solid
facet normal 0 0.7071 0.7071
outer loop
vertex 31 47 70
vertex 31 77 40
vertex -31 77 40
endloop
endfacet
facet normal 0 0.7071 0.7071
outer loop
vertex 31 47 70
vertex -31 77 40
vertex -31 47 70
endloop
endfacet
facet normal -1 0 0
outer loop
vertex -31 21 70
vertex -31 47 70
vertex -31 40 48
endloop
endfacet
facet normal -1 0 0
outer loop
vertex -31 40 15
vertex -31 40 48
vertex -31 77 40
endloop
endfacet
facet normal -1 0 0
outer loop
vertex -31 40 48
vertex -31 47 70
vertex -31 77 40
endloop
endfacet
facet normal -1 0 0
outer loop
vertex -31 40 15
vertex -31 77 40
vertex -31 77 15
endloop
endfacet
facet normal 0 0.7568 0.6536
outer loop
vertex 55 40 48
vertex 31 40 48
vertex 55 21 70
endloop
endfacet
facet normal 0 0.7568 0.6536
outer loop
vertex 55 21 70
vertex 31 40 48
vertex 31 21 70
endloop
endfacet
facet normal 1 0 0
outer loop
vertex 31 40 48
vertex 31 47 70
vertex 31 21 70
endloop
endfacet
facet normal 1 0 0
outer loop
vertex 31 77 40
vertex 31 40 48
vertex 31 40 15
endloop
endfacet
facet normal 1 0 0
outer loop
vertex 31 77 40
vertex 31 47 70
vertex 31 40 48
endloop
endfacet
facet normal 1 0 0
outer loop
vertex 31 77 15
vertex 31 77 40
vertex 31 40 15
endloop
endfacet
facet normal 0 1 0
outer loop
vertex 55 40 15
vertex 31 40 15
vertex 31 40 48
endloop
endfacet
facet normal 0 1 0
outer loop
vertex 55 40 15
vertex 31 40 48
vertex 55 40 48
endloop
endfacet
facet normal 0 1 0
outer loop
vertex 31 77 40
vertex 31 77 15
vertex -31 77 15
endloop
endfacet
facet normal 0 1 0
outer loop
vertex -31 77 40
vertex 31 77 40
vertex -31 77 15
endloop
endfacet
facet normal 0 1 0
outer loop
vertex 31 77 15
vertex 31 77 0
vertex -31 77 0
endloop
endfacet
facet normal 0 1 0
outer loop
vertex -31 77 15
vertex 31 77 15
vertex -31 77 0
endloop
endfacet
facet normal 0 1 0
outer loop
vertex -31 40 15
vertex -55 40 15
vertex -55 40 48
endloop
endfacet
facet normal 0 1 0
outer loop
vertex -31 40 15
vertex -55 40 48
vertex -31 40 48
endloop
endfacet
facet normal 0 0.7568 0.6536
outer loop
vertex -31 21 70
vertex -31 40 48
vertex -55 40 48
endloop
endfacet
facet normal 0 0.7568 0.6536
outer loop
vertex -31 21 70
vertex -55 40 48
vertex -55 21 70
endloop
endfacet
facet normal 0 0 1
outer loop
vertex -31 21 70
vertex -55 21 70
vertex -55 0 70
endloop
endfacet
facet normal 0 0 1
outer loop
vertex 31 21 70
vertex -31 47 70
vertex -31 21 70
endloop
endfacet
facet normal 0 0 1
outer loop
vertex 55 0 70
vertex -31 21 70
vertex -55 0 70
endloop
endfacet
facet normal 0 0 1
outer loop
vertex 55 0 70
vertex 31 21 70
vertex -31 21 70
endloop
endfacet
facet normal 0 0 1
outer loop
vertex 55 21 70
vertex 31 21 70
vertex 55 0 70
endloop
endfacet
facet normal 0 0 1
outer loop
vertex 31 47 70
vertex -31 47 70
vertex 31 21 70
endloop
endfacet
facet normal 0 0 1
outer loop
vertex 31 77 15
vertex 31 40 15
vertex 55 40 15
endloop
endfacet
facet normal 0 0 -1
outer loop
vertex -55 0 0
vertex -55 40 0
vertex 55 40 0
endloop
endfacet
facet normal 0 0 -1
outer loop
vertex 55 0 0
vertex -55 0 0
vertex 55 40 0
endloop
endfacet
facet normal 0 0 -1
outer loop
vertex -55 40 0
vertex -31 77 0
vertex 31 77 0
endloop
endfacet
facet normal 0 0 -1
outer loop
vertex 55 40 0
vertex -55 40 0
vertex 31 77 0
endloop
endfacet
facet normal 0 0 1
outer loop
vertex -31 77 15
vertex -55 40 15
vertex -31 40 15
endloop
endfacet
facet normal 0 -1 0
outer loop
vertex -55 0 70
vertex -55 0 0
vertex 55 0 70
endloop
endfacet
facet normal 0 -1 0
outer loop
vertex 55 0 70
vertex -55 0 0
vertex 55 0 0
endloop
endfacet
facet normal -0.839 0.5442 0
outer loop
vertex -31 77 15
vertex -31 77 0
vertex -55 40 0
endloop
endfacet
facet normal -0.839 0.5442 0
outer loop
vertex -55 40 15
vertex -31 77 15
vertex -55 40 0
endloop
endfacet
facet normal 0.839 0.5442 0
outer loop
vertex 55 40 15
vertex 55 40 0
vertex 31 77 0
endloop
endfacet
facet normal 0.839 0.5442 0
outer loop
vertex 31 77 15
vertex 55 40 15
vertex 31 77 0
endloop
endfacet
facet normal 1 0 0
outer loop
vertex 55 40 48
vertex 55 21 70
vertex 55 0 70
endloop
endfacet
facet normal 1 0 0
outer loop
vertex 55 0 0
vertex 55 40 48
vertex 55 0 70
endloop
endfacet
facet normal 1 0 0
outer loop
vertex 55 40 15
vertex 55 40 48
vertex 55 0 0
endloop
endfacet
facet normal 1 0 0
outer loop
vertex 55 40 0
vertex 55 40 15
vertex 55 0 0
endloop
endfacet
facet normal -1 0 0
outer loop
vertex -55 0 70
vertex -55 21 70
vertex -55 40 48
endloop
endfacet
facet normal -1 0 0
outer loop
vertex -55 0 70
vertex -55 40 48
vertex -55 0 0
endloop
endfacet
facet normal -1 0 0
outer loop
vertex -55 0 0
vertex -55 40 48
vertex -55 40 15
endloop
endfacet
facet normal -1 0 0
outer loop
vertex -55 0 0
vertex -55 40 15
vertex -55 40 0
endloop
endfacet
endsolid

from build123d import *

# Parameters (mm, degrees)
EXTRUDE_4_DEPTH  = 70
SKETCH_4_3_W     = 24
SKETCH_4_3_H     = 19
EXTRUDE_5_DEPTH  = 48
SKETCH_4_4_W     = 31
SKETCH_4_4_H     = 30
EXTRUDE_6_DEPTH  = 40
EXTRUDE_7_DEPTH  = 15
EXTRUDE_8_DEPTH  = 62
EXTRUDE_9_DEPTH  = 24
EXTRUDE_10_DEPTH = 86


with BuildPart() as part:
    # 스케치4 → 보스-돌출4 (new body)
    with BuildSketch(Plane.XY):
        Polygon((-55, 0), (0, 0), (0, 47), (-31, 47), (-31, 40), (-31, 21), (-55, 21), align=None)
        Polygon((0, 47), (0, 0), (55, 0), (55, 21), (31, 21), (31, 40), (31, 47), align=None)
    extrude(amount=EXTRUDE_4_DEPTH)

    # 스케치4<3> → 보스-돌출5 (add)
    with BuildSketch(Plane.XY):
        with Locations((43, 30.5)):
            Rectangle(SKETCH_4_3_W, SKETCH_4_3_H)
        with Locations((-43, 30.5)):
            Rectangle(SKETCH_4_3_W, SKETCH_4_3_H)
    extrude(amount=EXTRUDE_5_DEPTH)

    # 스케치4<4> → 보스-돌출6 (add)
    with BuildSketch(Plane.XY):
        with Locations((-15.5, 62)):
            Rectangle(SKETCH_4_4_W, SKETCH_4_4_H)
        with Locations((15.5, 62)):
            Rectangle(SKETCH_4_4_W, SKETCH_4_4_H)
    extrude(amount=EXTRUDE_6_DEPTH)

    # 스케치4<5> → 보스-돌출7 (add)
    with BuildSketch(Plane.XY):
        Polygon((31, 40), (55, 40), (31, 77), (31, 47), align=None)
        Polygon((-31, 77), (-55, 40), (-31, 40), (-31, 47), align=None)
    extrude(amount=EXTRUDE_7_DEPTH)

    # 스케치6 → 보스-돌출8 (add)
    with BuildSketch(Plane(origin=(31, 0, 0), x_dir=(0, 0, -1), z_dir=(1, 0, 0))):
        Polygon((-40, 77), (-70, 47), (-40, 47), align=None)
    extrude(amount=-EXTRUDE_8_DEPTH)

    # 스케치6<3> → 보스-돌출9 (add)
    with BuildSketch(Plane(origin=(31, 0, 0), x_dir=(0, 0, -1), z_dir=(1, 0, 0))):
        Polygon((-48, 40), (-70, 21), (-48, 21), align=None)
    extrude(amount=EXTRUDE_9_DEPTH)

    # 스케치6<4> → 보스-돌출10 (add)
    with BuildSketch(Plane(origin=(31, 0, 0), x_dir=(0, 0, -1), z_dir=(1, 0, 0))):
        Polygon((-48, 40), (-70, 21), (-48, 21), align=None)
    extrude(amount=-EXTRUDE_10_DEPTH)


solid = part.part
